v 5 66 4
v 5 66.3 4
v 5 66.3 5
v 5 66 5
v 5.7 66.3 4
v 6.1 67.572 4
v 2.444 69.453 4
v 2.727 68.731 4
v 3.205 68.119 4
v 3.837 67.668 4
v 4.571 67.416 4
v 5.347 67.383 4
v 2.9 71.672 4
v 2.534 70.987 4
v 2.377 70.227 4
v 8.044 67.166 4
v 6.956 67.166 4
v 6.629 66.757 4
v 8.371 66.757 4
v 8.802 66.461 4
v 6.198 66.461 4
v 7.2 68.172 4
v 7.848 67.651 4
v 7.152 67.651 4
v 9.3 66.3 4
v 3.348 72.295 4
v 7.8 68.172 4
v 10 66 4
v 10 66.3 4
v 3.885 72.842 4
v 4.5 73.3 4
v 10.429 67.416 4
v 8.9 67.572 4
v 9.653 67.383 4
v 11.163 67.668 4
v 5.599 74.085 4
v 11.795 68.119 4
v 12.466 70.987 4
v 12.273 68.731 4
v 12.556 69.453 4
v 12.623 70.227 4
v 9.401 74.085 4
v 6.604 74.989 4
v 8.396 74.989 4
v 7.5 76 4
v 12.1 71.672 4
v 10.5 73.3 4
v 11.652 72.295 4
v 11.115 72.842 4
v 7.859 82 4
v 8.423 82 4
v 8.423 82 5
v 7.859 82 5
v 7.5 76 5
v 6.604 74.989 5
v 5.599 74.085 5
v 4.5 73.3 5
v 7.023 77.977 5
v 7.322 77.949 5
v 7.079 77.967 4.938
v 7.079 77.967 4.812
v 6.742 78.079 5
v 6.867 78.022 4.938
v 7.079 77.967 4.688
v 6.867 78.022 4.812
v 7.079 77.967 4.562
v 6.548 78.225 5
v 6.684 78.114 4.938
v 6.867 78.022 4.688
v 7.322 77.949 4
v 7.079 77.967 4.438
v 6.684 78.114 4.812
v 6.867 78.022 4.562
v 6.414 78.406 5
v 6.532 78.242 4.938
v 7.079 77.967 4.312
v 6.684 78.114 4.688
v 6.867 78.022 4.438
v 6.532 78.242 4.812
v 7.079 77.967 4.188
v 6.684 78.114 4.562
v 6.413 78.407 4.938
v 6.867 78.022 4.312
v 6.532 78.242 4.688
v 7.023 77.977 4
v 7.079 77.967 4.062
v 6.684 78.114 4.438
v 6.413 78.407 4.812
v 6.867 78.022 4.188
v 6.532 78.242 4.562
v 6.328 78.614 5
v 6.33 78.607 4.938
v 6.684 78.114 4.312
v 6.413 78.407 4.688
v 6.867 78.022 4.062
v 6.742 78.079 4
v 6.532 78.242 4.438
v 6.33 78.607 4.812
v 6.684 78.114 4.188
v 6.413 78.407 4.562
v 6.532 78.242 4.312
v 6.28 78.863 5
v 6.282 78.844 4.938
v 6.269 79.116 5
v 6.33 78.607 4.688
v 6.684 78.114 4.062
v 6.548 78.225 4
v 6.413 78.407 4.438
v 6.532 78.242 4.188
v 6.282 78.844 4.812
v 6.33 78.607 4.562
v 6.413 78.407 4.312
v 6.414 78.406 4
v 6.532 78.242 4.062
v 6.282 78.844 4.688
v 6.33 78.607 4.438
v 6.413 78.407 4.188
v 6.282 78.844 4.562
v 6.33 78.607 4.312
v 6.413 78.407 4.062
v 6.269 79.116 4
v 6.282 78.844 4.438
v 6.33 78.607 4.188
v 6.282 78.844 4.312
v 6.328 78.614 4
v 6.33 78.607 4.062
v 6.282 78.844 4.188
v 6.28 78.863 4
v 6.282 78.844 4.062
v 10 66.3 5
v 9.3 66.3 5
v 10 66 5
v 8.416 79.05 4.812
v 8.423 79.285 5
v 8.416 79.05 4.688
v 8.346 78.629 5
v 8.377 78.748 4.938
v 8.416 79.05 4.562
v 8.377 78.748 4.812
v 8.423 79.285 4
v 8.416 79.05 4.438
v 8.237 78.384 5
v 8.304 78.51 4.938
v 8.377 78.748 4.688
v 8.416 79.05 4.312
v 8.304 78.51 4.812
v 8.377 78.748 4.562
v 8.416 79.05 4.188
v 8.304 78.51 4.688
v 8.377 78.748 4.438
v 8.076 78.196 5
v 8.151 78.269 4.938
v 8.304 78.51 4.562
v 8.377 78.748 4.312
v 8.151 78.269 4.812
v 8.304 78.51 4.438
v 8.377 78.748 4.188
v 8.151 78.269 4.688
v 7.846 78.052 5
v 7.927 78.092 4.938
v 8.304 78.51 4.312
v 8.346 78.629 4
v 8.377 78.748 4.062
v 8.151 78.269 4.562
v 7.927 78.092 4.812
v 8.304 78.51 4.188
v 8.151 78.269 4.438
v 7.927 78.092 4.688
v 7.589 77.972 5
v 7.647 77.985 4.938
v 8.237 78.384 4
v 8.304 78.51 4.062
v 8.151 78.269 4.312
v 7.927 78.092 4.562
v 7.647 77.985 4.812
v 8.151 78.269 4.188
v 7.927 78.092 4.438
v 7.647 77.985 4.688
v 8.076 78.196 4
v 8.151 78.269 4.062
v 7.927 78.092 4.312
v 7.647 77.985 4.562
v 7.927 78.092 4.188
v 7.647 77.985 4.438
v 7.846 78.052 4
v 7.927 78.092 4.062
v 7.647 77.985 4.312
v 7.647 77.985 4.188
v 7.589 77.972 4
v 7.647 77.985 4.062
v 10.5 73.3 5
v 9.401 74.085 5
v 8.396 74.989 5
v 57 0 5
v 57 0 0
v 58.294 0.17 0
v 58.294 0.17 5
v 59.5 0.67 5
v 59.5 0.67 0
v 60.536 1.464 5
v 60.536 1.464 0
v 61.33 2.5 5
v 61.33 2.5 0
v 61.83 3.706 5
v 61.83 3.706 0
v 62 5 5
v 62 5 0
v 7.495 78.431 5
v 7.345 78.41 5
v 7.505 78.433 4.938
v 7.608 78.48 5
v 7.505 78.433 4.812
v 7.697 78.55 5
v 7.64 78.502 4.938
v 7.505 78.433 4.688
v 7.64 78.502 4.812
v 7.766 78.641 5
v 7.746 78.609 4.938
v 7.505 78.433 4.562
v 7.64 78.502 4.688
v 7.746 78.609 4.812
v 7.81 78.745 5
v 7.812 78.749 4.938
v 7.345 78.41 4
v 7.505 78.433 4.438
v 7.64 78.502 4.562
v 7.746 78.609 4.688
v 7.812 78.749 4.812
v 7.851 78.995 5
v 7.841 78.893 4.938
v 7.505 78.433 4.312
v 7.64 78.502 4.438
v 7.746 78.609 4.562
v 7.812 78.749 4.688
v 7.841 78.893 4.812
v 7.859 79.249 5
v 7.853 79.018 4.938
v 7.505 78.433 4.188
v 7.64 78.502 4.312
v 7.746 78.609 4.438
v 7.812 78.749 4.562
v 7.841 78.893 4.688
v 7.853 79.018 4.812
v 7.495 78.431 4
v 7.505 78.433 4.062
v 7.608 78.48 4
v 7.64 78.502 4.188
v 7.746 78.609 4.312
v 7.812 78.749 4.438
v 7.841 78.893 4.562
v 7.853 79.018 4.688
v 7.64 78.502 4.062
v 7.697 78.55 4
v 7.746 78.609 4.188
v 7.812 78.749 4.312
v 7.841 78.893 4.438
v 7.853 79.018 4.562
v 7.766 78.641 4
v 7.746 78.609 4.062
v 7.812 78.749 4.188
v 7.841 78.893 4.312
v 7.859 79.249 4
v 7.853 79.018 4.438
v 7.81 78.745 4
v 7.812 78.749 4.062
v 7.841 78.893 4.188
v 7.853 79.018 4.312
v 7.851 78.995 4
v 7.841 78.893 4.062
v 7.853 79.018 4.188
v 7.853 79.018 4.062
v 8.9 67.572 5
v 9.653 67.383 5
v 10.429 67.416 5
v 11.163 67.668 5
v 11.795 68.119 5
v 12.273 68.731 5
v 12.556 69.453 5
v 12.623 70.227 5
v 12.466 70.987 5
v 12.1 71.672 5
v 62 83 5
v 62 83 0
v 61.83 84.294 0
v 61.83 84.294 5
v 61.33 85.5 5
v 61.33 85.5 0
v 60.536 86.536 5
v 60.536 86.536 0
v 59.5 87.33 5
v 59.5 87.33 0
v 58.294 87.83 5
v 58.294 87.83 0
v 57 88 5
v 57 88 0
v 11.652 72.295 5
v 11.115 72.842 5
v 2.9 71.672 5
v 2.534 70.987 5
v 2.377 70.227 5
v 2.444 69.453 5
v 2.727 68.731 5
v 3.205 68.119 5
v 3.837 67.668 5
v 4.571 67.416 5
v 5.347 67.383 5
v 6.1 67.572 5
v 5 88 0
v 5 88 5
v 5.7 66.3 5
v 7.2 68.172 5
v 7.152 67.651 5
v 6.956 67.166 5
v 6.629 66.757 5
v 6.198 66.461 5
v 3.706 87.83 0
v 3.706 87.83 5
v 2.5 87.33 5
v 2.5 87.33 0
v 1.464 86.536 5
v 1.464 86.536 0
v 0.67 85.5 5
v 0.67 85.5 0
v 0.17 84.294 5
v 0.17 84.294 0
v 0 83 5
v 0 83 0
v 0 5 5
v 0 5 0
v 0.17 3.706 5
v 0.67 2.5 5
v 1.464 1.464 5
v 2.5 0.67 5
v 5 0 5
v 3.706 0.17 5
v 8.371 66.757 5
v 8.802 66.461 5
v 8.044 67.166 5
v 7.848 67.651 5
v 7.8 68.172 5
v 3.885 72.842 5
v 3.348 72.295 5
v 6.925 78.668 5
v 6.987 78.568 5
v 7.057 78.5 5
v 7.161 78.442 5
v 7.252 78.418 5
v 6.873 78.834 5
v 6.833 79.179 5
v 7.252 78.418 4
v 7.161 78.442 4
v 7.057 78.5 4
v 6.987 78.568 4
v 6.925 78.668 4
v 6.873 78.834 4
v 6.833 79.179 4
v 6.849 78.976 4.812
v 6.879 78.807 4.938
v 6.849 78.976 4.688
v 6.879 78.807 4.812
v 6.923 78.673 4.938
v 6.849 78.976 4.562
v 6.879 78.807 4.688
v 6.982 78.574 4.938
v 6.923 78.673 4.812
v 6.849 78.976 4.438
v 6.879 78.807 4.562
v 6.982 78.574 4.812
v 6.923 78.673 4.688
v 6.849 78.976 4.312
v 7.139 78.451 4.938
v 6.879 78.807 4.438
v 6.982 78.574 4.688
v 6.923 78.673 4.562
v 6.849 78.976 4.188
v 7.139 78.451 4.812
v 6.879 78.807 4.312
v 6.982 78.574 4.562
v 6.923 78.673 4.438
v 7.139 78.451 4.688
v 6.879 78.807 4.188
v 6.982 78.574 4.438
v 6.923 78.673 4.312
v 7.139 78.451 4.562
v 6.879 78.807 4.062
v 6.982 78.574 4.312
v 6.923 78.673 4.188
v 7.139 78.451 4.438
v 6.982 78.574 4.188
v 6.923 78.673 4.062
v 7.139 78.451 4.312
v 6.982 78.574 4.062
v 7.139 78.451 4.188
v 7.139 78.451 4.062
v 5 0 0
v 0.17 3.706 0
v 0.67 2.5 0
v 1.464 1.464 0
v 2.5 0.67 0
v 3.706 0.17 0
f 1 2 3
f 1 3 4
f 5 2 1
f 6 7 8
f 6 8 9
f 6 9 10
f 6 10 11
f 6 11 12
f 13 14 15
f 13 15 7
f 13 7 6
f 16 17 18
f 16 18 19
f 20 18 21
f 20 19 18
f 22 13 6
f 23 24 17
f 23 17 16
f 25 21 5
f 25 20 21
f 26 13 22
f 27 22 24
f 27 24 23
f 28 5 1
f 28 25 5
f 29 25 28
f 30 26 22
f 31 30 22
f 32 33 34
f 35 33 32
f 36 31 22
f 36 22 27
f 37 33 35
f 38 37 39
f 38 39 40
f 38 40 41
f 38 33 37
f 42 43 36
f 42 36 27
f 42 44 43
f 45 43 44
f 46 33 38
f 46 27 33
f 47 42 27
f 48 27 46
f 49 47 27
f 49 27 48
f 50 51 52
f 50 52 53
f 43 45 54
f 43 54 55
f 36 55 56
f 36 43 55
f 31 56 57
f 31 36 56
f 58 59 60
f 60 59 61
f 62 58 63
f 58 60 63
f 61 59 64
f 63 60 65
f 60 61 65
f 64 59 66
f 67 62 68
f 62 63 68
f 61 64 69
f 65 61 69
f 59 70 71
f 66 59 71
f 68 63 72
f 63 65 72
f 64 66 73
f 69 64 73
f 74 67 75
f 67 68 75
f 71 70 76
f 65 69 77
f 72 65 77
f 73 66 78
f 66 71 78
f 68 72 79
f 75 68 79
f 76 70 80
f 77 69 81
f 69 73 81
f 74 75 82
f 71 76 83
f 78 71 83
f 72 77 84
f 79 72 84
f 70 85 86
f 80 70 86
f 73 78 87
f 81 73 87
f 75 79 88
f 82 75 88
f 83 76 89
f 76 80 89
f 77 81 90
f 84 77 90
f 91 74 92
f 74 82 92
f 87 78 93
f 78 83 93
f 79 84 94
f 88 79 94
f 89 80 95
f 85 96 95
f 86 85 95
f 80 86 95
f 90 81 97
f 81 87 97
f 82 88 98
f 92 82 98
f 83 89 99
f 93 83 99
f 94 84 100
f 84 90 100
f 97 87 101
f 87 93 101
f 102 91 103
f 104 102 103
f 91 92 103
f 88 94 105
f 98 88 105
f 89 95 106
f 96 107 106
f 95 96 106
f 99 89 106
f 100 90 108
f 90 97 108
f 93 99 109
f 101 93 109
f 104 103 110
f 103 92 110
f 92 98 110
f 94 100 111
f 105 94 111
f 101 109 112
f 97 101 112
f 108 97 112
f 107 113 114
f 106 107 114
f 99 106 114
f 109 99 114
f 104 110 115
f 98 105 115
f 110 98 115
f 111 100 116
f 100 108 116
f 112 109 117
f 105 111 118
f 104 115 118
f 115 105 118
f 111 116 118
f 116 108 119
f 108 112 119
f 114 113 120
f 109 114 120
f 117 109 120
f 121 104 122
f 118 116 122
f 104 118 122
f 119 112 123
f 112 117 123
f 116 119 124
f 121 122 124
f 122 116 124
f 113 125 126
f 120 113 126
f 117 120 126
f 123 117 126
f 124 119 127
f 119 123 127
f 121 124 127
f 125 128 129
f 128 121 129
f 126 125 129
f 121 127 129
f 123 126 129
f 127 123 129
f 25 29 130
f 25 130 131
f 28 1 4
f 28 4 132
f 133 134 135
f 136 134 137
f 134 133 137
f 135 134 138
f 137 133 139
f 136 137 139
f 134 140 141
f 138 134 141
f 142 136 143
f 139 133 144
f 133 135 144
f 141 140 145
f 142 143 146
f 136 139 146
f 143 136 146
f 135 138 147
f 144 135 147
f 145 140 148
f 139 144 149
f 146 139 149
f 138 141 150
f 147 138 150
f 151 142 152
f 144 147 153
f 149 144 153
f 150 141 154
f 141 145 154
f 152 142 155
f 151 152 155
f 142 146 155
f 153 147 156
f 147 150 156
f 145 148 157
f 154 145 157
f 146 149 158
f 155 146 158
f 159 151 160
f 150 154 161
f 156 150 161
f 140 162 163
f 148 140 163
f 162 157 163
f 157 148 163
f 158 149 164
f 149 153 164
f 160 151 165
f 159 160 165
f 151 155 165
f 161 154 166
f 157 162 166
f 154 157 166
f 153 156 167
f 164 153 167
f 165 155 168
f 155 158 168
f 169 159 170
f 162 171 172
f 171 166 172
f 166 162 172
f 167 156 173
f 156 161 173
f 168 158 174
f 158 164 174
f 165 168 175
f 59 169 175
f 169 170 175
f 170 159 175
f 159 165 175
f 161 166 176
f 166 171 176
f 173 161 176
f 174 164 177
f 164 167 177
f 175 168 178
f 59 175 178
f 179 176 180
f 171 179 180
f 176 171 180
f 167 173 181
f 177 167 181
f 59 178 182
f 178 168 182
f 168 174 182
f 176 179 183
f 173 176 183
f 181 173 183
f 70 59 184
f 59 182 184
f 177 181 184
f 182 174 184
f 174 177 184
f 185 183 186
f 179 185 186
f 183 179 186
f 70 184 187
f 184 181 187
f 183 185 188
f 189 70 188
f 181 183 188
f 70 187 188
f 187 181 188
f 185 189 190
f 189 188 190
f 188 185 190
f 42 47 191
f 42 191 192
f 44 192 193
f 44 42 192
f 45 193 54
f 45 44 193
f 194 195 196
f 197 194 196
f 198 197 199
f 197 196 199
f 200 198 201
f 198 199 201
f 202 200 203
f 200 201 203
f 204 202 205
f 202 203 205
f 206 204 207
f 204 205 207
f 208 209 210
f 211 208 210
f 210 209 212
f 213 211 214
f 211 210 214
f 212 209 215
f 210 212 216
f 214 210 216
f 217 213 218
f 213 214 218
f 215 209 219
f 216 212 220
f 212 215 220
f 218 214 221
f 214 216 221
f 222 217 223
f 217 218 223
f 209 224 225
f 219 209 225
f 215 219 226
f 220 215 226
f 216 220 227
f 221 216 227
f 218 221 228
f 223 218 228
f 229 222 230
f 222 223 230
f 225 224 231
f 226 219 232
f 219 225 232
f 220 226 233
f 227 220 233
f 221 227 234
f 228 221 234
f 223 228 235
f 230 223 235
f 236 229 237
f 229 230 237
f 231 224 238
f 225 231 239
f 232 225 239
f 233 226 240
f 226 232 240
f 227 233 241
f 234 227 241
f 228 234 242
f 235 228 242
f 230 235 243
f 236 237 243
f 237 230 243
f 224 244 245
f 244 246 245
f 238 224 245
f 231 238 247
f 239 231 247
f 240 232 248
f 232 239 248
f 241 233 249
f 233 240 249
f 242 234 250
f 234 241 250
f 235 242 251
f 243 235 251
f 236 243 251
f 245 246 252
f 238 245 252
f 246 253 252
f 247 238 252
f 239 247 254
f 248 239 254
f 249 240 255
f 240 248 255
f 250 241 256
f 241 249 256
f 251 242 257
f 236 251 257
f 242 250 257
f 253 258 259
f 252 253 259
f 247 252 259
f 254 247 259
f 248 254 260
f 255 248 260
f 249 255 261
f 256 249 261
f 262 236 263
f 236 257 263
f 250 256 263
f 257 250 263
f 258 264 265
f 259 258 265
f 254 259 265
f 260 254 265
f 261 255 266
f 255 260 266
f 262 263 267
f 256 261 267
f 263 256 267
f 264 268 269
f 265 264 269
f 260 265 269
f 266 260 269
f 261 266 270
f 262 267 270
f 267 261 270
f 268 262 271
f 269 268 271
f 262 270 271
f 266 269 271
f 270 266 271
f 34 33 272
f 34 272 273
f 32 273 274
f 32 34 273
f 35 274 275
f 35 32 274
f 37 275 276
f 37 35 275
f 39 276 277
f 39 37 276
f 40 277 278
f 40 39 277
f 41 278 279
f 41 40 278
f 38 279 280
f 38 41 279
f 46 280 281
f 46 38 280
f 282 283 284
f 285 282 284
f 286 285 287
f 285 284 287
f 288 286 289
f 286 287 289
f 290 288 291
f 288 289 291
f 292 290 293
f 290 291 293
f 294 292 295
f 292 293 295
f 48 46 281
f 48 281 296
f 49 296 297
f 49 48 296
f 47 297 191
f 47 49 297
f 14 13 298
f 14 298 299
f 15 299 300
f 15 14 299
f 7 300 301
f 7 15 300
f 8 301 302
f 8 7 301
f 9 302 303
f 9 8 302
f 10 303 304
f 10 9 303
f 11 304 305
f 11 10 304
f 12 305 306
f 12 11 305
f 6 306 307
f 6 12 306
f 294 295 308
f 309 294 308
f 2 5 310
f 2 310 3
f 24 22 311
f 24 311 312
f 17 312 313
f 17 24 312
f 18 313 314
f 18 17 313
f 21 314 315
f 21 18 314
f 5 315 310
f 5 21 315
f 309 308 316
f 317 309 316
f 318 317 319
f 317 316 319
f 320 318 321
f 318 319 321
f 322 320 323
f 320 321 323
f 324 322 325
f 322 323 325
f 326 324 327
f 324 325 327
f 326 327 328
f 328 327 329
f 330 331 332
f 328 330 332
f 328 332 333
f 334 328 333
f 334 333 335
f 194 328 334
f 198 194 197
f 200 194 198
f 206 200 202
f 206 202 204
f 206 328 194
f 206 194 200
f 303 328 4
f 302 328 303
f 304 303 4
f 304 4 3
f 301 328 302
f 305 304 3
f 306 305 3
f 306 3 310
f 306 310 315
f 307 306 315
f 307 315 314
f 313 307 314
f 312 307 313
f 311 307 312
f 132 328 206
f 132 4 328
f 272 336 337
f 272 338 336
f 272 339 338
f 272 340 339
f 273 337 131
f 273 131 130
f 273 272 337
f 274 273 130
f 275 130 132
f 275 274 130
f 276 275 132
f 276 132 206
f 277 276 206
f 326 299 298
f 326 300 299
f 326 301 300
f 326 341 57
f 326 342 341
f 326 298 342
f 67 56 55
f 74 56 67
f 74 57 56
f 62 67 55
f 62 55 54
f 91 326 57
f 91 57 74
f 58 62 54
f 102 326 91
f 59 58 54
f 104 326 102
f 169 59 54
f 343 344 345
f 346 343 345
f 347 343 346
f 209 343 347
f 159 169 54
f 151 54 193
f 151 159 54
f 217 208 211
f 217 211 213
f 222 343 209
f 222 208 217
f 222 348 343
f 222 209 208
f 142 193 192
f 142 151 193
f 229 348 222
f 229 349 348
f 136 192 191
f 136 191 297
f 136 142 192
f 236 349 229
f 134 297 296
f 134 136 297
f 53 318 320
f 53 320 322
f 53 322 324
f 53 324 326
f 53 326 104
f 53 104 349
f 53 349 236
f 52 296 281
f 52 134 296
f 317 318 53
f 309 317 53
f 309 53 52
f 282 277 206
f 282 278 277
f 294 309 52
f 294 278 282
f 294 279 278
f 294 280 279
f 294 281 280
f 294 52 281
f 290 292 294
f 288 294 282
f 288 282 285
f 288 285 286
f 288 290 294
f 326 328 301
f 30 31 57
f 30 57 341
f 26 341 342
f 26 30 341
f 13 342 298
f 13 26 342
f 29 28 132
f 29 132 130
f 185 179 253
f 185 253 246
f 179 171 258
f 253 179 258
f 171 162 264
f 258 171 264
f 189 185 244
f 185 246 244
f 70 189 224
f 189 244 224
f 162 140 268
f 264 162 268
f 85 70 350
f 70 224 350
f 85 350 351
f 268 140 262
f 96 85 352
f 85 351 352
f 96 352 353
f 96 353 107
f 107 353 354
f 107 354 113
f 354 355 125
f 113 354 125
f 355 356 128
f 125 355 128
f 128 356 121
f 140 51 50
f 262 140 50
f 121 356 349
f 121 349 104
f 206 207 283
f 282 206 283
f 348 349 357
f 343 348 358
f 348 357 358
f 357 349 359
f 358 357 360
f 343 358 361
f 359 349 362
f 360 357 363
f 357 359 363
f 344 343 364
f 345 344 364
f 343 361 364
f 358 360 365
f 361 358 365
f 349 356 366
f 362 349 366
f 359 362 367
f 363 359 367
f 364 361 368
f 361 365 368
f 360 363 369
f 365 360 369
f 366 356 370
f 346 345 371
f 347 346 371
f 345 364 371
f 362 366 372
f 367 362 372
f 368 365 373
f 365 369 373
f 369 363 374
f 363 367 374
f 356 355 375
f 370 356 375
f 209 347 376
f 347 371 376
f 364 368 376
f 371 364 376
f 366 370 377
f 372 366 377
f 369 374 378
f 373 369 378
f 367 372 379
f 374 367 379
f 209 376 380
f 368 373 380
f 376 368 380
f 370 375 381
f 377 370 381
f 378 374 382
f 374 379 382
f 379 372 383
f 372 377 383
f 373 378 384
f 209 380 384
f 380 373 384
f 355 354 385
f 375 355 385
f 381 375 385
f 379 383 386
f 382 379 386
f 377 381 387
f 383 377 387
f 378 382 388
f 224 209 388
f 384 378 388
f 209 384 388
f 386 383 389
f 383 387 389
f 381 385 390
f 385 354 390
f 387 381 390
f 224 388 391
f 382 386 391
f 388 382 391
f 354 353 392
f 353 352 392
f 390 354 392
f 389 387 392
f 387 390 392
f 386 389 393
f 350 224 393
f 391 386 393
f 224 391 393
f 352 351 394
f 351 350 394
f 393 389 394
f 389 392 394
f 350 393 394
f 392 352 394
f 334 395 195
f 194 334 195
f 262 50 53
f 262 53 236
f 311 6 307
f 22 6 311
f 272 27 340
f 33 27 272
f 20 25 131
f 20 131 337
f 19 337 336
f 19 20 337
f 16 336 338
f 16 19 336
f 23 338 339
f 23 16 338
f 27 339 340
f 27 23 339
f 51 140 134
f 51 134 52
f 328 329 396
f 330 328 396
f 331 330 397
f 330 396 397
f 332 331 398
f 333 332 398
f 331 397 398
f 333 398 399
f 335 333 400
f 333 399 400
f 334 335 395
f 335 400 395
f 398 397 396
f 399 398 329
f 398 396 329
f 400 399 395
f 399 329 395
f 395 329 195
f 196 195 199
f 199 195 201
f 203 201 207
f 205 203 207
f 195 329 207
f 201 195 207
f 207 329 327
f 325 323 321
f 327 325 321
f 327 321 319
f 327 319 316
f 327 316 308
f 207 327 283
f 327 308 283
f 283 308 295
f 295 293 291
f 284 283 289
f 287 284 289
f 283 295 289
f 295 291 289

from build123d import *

# Parameters (mm, degrees)
EXTRUDE_1_DEPTH     = 5
CUT_EXTRUDE_START   = -1
CUT_EXTRUDE_3_DEPTH = 1


# Read off the part's stored shape, not the designer's step: Вырез-Вытянуть3
with BuildPart() as part:
    # Эскиз1 → Бобышка-Вытянуть1 (new body)
    with BuildSketch(Plane.XY):
        with BuildLine():
            Line((5, 0), (57, 0))
            ThreePointArc((57, 0), (60.535533906, 1.464466094), (62, 5))
            Line((62, 5), (62, 83))
            ThreePointArc((62, 83), (60.535533906, 86.535533906), (57, 88))
            Line((57, 88), (5, 88))
            ThreePointArc((5, 88), (1.464466094, 86.535533906), (0, 83))
            Line((0, 83), (0, 5))
            ThreePointArc((0, 5), (1.464466094, 1.464466094), (5, 0))
        make_face()
    extrude(amount=EXTRUDE_1_DEPTH)

    # Вырез-Вытянуть3 outline → Вырез-Вытянуть3 (cut)
    with BuildSketch(Plane.XY.offset(5).offset(CUT_EXTRUDE_START)):
        with BuildLine():
            add(Edge.make_bspline(
                [(7.322115385, 77.948717949), (7.280403728, 77.949629189), (7.199154126, 77.951404182), (7.08103096, 77.965514138), (6.970032623, 77.986734715), (6.86753928, 78.020868189), (6.771471542, 78.06080497), (6.683688955, 78.112132534), (6.602688938, 78.171353702), (6.530522286, 78.24100741), (6.465447665, 78.318830964), (6.41163812, 78.407249412), (6.364084469, 78.503063707), (6.328183734, 78.608942585), (6.298735587, 78.722922407), (6.2805208, 78.846457423), (6.268556671, 78.978392008), (6.269001965, 79.069415592), (6.269230769, 79.116185897)],
                knots=[0, 0, 0, 0, 0.069384338, 0.135152862, 0.197735709, 0.257048427, 0.31458961, 0.370543528, 0.425833354, 0.481158895, 0.537040397, 0.594138756, 0.652974992, 0.714682156, 0.779789612, 0.848620873, 0.922217432, 1, 1, 1, 1], degree=3))
            add(Edge.make_bspline(
                [(8.423076923, 79.28525641), (8.422846482, 79.24465196), (8.422400519, 79.16607163), (8.416777036, 79.051655992), (8.406996568, 78.94425203), (8.394710578, 78.843624109), (8.377857705, 78.749984901), (8.357009271, 78.663646779), (8.333382771, 78.583908695), (8.296299771, 78.48874028), (8.239839042, 78.380770097), (8.153444079, 78.266259522), (8.049022592, 78.168573661), (7.9277584, 78.088174586), (7.79256156, 78.026127128), (7.645762848, 77.981077752), (7.487701683, 77.953199535), (7.378323021, 77.950239206), (7.322115385, 77.948717949)],
                knots=[0, 0, 0, 0, 0.061211027, 0.118459496, 0.172633106, 0.223776859, 0.271245742, 0.315976481, 0.35763086, 0.396515037, 0.469825178, 0.540534635, 0.611753614, 0.684345849, 0.758929938, 0.835221686, 0.915323526, 1, 1, 1, 1], degree=3))
            Line((8.423076923, 79.28525641), (8.423076923, 82))
            Line((8.423076923, 82), (7.858974359, 82))
            Line((7.858974359, 82), (7.858974359, 79.249198718))
            add(Edge.make_bspline(
                [(7.345352564, 78.41025641), (7.372975773, 78.411180822), (7.4269515, 78.412987123), (7.504373326, 78.431551652), (7.576511792, 78.459404941), (7.641326576, 78.500074876), (7.699113429, 78.549562242), (7.748268345, 78.607960428), (7.785711282, 78.675450105), (7.809293621, 78.737761499), (7.823759213, 78.793221645), (7.83322618, 78.841401042), (7.841207325, 78.895150355), (7.847235632, 78.954806458), (7.853355796, 79.020196267), (7.855800765, 79.091605618), (7.858650581, 79.16851443), (7.858863947, 79.221684424), (7.858974359, 79.249198718)],
                knots=[0, 0, 0, 0, 0.073594239, 0.143803085, 0.211314618, 0.27917152, 0.346904743, 0.413716382, 0.481711687, 0.551880712, 0.590958341, 0.634577158, 0.682868024, 0.735927242, 0.794594596, 0.858103432, 0.926571669, 1, 1, 1, 1], degree=3))
            add(Edge.make_bspline(
                [(6.833333333, 79.179487179), (6.834857441, 79.143941678), (6.83777302, 79.075944064), (6.84743928, 78.978324165), (6.860933127, 78.889536466), (6.877643129, 78.809256715), (6.897109916, 78.737429188), (6.921534218, 78.674633381), (6.947839007, 78.619549931), (6.980181111, 78.573892339), (7.014857408, 78.53487098), (7.053004363, 78.501738163), (7.094129871, 78.473504515), (7.138151962, 78.450181335), (7.185565934, 78.432291412), (7.235878922, 78.419864447), (7.289505669, 78.411261561), (7.326352813, 78.410598374), (7.345352564, 78.41025641)],
                knots=[0, 0, 0, 0, 0.102038713, 0.195197389, 0.281231404, 0.35951733, 0.430343554, 0.494370791, 0.552618194, 0.604901828, 0.654275293, 0.702059837, 0.749449665, 0.797086574, 0.844612455, 0.894412072, 0.945554958, 1, 1, 1, 1], degree=3))
            Line((6.833333333, 79.179487179), (6.269230769, 79.116185897))
        make_face()
        with BuildLine():
            ThreePointArc((10.5, 73.3), (8.885670907, 74.522967675), (7.5, 76))
            ThreePointArc((7.5, 76), (6.114329093, 74.522967675), (4.5, 73.3))
            ThreePointArc((4.5, 73.3), (3.605830756, 72.578400365), (2.9, 71.67173195))
            ThreePointArc((2.9, 71.67173195), (2.944094794, 68.407366911), (6.1, 67.57173195))
            Line((6.1, 67.57173195), (7.2, 68.17173195))
            ThreePointArc((7.2, 68.17173195), (6.807193425, 66.949612307), (5.7, 66.3))
            Line((5.7, 66.3), (5, 66.3))
            Line((5, 66.3), (5, 66))
            Line((5, 66), (10, 66))
            Line((10, 66), (10, 66.3))
            Line((10, 66.3), (9.3, 66.3))
            ThreePointArc((9.3, 66.3), (8.192806575, 66.949612307), (7.8, 68.17173195))
            Line((7.8, 68.17173195), (8.9, 67.57173195))
            ThreePointArc((8.9, 67.57173195), (12.055905206, 68.407366911), (12.1, 71.67173195))
            ThreePointArc((12.1, 71.67173195), (11.394169244, 72.578400365), (10.5, 73.3))
        make_face()
    extrude(amount=CUT_EXTRUDE_3_DEPTH, mode=Mode.SUBTRACT)


solid = part.part
